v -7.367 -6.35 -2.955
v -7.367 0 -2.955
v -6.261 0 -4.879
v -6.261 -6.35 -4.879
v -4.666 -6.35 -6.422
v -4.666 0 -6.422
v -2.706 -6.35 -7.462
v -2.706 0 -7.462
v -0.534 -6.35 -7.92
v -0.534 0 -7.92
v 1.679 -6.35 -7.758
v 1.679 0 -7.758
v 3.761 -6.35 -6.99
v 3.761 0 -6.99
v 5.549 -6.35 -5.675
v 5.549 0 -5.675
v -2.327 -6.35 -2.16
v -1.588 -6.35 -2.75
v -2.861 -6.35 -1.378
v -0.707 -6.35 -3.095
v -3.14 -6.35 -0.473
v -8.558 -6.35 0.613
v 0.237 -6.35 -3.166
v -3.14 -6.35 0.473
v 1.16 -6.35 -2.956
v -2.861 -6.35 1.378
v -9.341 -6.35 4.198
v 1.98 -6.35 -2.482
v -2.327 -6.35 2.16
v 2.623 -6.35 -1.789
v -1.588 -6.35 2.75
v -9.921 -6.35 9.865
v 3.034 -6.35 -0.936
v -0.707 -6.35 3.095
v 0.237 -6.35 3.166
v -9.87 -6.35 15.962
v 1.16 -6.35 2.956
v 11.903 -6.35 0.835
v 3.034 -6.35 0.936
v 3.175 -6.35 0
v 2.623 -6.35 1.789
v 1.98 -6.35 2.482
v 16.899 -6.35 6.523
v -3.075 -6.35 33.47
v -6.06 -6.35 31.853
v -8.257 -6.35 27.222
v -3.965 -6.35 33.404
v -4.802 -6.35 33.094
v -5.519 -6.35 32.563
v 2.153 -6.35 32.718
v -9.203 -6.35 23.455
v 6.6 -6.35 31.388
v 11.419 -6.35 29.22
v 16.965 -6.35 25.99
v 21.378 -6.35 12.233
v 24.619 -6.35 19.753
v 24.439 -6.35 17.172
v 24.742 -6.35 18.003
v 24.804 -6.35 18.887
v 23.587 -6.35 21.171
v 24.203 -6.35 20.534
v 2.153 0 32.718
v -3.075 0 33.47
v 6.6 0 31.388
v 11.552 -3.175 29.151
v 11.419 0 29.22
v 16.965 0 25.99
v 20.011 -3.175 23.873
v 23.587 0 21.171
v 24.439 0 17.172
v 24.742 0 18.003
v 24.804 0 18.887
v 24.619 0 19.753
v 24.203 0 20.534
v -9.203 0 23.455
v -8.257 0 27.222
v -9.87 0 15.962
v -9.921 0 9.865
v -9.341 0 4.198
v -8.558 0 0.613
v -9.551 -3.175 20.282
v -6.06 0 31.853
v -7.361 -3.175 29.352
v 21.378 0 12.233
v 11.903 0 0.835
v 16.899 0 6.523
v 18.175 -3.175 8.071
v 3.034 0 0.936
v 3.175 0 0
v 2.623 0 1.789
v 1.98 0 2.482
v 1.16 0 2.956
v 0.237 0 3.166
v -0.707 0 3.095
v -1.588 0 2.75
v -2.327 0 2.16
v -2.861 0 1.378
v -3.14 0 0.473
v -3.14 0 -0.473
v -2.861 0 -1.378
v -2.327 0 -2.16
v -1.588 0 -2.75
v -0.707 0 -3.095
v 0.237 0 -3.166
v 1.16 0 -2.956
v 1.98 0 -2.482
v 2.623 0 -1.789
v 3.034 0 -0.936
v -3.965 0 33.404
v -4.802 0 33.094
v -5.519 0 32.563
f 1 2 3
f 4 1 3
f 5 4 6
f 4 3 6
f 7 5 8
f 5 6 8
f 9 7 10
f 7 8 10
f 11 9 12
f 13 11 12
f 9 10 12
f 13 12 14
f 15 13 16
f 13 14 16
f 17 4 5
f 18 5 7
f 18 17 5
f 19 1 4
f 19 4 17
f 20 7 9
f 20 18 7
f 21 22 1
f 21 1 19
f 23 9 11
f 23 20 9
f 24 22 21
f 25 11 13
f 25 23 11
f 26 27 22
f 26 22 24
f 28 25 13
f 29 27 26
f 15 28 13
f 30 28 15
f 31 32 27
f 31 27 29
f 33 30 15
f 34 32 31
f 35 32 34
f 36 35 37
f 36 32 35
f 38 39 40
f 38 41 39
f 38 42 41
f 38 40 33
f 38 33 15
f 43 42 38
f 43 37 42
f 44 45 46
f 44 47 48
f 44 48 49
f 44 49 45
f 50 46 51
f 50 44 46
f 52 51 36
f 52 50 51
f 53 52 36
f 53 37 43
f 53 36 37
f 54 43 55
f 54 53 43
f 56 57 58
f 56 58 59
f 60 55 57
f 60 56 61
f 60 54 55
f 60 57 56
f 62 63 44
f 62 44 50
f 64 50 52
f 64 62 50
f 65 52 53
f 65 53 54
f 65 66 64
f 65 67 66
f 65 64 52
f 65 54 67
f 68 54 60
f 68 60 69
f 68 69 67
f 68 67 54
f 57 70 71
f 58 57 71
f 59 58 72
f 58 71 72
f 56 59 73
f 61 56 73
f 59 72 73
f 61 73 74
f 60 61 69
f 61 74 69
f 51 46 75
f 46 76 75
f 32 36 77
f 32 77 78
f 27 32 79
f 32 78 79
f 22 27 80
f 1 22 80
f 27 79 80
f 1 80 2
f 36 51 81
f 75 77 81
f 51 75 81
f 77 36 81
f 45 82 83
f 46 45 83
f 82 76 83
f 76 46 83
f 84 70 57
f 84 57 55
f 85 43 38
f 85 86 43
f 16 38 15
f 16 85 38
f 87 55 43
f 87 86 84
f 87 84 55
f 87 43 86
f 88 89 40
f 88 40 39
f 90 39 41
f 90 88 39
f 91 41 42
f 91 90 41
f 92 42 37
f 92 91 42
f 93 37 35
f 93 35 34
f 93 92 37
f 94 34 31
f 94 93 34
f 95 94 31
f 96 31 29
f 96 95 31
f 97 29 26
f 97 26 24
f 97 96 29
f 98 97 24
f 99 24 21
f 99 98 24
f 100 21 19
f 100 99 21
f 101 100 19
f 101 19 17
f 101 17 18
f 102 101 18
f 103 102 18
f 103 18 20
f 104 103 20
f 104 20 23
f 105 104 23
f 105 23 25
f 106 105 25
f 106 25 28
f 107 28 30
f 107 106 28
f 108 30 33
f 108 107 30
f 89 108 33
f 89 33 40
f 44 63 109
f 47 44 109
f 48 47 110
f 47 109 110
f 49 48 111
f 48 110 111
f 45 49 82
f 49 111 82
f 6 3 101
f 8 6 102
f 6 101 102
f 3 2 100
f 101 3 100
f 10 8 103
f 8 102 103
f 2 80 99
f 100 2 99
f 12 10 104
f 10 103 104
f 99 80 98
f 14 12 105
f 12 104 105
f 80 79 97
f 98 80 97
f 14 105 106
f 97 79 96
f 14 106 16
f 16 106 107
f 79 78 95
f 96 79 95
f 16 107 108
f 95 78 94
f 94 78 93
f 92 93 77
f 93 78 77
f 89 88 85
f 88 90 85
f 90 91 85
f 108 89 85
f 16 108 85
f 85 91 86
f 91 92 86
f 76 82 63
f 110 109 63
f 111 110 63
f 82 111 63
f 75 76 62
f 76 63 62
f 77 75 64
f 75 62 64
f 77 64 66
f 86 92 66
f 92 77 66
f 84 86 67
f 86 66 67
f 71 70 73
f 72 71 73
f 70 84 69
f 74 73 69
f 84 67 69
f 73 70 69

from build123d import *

# Parameters (mm, degrees)
F0_R     = 3.175
F1_DEPTH = 6.35


with BuildPart() as f1:
    # F0 (on Front) → F1 (new body)
    with BuildSketch(Plane.XZ):
        with BuildLine():
            add(Edge.make_bspline(
                [(-6.0602840723, 31.8534711944), (-8.9123209928, 26.7616721507), (-9.5678060072, 21.1194401062), (-10.7354209084, 5.442497338), (-7.3669134372, -2.9550791291)],
                knots=[0, 0, 0, 0, 0.4184743156, 1, 1, 1, 1], degree=3))
            ThreePointArc((-7.3669134372, -2.9550791291), (-1.63587801, -7.7670978741), (5.5491886165, -5.6754217419))
            add(Edge.make_bspline(
                [(24.4385115585, 17.1715788698), (22.5209788834, 13.5742014085), (17.275688011, 6.7190147021), (11.0943717174, -0.2535749894), (5.5491886165, -5.6754217419)],
                knots=[0.1380846356, 0.1380846356, 0.1380846356, 0.1380846356, 0.4828720967, 1, 1, 1, 1], degree=3))
            ThreePointArc((24.4385115585, 17.1715788698), (24.7420563147, 19.326379645), (23.5868786889, 21.1705245559))
            add(Edge.make_bspline(
                [(-3.074806905, 33.4695786248), (3.1958280854, 33.0431476028), (12.0935678521, 29.2874679133), (18.4108124786, 25.1994105978), (23.5868786889, 21.1705245559)],
                knots=[0, 0, 0, 0, 0.5068320595, 1, 1, 1, 1], degree=3))
            ThreePointArc((-3.074806905, 33.4695786248), (-4.8016804973, 33.0940485831), (-6.0602840723, 31.8534711944))
        make_face()
        Circle(F0_R, mode=Mode.SUBTRACT)
    extrude(amount=F1_DEPTH)


solid = f1.part
